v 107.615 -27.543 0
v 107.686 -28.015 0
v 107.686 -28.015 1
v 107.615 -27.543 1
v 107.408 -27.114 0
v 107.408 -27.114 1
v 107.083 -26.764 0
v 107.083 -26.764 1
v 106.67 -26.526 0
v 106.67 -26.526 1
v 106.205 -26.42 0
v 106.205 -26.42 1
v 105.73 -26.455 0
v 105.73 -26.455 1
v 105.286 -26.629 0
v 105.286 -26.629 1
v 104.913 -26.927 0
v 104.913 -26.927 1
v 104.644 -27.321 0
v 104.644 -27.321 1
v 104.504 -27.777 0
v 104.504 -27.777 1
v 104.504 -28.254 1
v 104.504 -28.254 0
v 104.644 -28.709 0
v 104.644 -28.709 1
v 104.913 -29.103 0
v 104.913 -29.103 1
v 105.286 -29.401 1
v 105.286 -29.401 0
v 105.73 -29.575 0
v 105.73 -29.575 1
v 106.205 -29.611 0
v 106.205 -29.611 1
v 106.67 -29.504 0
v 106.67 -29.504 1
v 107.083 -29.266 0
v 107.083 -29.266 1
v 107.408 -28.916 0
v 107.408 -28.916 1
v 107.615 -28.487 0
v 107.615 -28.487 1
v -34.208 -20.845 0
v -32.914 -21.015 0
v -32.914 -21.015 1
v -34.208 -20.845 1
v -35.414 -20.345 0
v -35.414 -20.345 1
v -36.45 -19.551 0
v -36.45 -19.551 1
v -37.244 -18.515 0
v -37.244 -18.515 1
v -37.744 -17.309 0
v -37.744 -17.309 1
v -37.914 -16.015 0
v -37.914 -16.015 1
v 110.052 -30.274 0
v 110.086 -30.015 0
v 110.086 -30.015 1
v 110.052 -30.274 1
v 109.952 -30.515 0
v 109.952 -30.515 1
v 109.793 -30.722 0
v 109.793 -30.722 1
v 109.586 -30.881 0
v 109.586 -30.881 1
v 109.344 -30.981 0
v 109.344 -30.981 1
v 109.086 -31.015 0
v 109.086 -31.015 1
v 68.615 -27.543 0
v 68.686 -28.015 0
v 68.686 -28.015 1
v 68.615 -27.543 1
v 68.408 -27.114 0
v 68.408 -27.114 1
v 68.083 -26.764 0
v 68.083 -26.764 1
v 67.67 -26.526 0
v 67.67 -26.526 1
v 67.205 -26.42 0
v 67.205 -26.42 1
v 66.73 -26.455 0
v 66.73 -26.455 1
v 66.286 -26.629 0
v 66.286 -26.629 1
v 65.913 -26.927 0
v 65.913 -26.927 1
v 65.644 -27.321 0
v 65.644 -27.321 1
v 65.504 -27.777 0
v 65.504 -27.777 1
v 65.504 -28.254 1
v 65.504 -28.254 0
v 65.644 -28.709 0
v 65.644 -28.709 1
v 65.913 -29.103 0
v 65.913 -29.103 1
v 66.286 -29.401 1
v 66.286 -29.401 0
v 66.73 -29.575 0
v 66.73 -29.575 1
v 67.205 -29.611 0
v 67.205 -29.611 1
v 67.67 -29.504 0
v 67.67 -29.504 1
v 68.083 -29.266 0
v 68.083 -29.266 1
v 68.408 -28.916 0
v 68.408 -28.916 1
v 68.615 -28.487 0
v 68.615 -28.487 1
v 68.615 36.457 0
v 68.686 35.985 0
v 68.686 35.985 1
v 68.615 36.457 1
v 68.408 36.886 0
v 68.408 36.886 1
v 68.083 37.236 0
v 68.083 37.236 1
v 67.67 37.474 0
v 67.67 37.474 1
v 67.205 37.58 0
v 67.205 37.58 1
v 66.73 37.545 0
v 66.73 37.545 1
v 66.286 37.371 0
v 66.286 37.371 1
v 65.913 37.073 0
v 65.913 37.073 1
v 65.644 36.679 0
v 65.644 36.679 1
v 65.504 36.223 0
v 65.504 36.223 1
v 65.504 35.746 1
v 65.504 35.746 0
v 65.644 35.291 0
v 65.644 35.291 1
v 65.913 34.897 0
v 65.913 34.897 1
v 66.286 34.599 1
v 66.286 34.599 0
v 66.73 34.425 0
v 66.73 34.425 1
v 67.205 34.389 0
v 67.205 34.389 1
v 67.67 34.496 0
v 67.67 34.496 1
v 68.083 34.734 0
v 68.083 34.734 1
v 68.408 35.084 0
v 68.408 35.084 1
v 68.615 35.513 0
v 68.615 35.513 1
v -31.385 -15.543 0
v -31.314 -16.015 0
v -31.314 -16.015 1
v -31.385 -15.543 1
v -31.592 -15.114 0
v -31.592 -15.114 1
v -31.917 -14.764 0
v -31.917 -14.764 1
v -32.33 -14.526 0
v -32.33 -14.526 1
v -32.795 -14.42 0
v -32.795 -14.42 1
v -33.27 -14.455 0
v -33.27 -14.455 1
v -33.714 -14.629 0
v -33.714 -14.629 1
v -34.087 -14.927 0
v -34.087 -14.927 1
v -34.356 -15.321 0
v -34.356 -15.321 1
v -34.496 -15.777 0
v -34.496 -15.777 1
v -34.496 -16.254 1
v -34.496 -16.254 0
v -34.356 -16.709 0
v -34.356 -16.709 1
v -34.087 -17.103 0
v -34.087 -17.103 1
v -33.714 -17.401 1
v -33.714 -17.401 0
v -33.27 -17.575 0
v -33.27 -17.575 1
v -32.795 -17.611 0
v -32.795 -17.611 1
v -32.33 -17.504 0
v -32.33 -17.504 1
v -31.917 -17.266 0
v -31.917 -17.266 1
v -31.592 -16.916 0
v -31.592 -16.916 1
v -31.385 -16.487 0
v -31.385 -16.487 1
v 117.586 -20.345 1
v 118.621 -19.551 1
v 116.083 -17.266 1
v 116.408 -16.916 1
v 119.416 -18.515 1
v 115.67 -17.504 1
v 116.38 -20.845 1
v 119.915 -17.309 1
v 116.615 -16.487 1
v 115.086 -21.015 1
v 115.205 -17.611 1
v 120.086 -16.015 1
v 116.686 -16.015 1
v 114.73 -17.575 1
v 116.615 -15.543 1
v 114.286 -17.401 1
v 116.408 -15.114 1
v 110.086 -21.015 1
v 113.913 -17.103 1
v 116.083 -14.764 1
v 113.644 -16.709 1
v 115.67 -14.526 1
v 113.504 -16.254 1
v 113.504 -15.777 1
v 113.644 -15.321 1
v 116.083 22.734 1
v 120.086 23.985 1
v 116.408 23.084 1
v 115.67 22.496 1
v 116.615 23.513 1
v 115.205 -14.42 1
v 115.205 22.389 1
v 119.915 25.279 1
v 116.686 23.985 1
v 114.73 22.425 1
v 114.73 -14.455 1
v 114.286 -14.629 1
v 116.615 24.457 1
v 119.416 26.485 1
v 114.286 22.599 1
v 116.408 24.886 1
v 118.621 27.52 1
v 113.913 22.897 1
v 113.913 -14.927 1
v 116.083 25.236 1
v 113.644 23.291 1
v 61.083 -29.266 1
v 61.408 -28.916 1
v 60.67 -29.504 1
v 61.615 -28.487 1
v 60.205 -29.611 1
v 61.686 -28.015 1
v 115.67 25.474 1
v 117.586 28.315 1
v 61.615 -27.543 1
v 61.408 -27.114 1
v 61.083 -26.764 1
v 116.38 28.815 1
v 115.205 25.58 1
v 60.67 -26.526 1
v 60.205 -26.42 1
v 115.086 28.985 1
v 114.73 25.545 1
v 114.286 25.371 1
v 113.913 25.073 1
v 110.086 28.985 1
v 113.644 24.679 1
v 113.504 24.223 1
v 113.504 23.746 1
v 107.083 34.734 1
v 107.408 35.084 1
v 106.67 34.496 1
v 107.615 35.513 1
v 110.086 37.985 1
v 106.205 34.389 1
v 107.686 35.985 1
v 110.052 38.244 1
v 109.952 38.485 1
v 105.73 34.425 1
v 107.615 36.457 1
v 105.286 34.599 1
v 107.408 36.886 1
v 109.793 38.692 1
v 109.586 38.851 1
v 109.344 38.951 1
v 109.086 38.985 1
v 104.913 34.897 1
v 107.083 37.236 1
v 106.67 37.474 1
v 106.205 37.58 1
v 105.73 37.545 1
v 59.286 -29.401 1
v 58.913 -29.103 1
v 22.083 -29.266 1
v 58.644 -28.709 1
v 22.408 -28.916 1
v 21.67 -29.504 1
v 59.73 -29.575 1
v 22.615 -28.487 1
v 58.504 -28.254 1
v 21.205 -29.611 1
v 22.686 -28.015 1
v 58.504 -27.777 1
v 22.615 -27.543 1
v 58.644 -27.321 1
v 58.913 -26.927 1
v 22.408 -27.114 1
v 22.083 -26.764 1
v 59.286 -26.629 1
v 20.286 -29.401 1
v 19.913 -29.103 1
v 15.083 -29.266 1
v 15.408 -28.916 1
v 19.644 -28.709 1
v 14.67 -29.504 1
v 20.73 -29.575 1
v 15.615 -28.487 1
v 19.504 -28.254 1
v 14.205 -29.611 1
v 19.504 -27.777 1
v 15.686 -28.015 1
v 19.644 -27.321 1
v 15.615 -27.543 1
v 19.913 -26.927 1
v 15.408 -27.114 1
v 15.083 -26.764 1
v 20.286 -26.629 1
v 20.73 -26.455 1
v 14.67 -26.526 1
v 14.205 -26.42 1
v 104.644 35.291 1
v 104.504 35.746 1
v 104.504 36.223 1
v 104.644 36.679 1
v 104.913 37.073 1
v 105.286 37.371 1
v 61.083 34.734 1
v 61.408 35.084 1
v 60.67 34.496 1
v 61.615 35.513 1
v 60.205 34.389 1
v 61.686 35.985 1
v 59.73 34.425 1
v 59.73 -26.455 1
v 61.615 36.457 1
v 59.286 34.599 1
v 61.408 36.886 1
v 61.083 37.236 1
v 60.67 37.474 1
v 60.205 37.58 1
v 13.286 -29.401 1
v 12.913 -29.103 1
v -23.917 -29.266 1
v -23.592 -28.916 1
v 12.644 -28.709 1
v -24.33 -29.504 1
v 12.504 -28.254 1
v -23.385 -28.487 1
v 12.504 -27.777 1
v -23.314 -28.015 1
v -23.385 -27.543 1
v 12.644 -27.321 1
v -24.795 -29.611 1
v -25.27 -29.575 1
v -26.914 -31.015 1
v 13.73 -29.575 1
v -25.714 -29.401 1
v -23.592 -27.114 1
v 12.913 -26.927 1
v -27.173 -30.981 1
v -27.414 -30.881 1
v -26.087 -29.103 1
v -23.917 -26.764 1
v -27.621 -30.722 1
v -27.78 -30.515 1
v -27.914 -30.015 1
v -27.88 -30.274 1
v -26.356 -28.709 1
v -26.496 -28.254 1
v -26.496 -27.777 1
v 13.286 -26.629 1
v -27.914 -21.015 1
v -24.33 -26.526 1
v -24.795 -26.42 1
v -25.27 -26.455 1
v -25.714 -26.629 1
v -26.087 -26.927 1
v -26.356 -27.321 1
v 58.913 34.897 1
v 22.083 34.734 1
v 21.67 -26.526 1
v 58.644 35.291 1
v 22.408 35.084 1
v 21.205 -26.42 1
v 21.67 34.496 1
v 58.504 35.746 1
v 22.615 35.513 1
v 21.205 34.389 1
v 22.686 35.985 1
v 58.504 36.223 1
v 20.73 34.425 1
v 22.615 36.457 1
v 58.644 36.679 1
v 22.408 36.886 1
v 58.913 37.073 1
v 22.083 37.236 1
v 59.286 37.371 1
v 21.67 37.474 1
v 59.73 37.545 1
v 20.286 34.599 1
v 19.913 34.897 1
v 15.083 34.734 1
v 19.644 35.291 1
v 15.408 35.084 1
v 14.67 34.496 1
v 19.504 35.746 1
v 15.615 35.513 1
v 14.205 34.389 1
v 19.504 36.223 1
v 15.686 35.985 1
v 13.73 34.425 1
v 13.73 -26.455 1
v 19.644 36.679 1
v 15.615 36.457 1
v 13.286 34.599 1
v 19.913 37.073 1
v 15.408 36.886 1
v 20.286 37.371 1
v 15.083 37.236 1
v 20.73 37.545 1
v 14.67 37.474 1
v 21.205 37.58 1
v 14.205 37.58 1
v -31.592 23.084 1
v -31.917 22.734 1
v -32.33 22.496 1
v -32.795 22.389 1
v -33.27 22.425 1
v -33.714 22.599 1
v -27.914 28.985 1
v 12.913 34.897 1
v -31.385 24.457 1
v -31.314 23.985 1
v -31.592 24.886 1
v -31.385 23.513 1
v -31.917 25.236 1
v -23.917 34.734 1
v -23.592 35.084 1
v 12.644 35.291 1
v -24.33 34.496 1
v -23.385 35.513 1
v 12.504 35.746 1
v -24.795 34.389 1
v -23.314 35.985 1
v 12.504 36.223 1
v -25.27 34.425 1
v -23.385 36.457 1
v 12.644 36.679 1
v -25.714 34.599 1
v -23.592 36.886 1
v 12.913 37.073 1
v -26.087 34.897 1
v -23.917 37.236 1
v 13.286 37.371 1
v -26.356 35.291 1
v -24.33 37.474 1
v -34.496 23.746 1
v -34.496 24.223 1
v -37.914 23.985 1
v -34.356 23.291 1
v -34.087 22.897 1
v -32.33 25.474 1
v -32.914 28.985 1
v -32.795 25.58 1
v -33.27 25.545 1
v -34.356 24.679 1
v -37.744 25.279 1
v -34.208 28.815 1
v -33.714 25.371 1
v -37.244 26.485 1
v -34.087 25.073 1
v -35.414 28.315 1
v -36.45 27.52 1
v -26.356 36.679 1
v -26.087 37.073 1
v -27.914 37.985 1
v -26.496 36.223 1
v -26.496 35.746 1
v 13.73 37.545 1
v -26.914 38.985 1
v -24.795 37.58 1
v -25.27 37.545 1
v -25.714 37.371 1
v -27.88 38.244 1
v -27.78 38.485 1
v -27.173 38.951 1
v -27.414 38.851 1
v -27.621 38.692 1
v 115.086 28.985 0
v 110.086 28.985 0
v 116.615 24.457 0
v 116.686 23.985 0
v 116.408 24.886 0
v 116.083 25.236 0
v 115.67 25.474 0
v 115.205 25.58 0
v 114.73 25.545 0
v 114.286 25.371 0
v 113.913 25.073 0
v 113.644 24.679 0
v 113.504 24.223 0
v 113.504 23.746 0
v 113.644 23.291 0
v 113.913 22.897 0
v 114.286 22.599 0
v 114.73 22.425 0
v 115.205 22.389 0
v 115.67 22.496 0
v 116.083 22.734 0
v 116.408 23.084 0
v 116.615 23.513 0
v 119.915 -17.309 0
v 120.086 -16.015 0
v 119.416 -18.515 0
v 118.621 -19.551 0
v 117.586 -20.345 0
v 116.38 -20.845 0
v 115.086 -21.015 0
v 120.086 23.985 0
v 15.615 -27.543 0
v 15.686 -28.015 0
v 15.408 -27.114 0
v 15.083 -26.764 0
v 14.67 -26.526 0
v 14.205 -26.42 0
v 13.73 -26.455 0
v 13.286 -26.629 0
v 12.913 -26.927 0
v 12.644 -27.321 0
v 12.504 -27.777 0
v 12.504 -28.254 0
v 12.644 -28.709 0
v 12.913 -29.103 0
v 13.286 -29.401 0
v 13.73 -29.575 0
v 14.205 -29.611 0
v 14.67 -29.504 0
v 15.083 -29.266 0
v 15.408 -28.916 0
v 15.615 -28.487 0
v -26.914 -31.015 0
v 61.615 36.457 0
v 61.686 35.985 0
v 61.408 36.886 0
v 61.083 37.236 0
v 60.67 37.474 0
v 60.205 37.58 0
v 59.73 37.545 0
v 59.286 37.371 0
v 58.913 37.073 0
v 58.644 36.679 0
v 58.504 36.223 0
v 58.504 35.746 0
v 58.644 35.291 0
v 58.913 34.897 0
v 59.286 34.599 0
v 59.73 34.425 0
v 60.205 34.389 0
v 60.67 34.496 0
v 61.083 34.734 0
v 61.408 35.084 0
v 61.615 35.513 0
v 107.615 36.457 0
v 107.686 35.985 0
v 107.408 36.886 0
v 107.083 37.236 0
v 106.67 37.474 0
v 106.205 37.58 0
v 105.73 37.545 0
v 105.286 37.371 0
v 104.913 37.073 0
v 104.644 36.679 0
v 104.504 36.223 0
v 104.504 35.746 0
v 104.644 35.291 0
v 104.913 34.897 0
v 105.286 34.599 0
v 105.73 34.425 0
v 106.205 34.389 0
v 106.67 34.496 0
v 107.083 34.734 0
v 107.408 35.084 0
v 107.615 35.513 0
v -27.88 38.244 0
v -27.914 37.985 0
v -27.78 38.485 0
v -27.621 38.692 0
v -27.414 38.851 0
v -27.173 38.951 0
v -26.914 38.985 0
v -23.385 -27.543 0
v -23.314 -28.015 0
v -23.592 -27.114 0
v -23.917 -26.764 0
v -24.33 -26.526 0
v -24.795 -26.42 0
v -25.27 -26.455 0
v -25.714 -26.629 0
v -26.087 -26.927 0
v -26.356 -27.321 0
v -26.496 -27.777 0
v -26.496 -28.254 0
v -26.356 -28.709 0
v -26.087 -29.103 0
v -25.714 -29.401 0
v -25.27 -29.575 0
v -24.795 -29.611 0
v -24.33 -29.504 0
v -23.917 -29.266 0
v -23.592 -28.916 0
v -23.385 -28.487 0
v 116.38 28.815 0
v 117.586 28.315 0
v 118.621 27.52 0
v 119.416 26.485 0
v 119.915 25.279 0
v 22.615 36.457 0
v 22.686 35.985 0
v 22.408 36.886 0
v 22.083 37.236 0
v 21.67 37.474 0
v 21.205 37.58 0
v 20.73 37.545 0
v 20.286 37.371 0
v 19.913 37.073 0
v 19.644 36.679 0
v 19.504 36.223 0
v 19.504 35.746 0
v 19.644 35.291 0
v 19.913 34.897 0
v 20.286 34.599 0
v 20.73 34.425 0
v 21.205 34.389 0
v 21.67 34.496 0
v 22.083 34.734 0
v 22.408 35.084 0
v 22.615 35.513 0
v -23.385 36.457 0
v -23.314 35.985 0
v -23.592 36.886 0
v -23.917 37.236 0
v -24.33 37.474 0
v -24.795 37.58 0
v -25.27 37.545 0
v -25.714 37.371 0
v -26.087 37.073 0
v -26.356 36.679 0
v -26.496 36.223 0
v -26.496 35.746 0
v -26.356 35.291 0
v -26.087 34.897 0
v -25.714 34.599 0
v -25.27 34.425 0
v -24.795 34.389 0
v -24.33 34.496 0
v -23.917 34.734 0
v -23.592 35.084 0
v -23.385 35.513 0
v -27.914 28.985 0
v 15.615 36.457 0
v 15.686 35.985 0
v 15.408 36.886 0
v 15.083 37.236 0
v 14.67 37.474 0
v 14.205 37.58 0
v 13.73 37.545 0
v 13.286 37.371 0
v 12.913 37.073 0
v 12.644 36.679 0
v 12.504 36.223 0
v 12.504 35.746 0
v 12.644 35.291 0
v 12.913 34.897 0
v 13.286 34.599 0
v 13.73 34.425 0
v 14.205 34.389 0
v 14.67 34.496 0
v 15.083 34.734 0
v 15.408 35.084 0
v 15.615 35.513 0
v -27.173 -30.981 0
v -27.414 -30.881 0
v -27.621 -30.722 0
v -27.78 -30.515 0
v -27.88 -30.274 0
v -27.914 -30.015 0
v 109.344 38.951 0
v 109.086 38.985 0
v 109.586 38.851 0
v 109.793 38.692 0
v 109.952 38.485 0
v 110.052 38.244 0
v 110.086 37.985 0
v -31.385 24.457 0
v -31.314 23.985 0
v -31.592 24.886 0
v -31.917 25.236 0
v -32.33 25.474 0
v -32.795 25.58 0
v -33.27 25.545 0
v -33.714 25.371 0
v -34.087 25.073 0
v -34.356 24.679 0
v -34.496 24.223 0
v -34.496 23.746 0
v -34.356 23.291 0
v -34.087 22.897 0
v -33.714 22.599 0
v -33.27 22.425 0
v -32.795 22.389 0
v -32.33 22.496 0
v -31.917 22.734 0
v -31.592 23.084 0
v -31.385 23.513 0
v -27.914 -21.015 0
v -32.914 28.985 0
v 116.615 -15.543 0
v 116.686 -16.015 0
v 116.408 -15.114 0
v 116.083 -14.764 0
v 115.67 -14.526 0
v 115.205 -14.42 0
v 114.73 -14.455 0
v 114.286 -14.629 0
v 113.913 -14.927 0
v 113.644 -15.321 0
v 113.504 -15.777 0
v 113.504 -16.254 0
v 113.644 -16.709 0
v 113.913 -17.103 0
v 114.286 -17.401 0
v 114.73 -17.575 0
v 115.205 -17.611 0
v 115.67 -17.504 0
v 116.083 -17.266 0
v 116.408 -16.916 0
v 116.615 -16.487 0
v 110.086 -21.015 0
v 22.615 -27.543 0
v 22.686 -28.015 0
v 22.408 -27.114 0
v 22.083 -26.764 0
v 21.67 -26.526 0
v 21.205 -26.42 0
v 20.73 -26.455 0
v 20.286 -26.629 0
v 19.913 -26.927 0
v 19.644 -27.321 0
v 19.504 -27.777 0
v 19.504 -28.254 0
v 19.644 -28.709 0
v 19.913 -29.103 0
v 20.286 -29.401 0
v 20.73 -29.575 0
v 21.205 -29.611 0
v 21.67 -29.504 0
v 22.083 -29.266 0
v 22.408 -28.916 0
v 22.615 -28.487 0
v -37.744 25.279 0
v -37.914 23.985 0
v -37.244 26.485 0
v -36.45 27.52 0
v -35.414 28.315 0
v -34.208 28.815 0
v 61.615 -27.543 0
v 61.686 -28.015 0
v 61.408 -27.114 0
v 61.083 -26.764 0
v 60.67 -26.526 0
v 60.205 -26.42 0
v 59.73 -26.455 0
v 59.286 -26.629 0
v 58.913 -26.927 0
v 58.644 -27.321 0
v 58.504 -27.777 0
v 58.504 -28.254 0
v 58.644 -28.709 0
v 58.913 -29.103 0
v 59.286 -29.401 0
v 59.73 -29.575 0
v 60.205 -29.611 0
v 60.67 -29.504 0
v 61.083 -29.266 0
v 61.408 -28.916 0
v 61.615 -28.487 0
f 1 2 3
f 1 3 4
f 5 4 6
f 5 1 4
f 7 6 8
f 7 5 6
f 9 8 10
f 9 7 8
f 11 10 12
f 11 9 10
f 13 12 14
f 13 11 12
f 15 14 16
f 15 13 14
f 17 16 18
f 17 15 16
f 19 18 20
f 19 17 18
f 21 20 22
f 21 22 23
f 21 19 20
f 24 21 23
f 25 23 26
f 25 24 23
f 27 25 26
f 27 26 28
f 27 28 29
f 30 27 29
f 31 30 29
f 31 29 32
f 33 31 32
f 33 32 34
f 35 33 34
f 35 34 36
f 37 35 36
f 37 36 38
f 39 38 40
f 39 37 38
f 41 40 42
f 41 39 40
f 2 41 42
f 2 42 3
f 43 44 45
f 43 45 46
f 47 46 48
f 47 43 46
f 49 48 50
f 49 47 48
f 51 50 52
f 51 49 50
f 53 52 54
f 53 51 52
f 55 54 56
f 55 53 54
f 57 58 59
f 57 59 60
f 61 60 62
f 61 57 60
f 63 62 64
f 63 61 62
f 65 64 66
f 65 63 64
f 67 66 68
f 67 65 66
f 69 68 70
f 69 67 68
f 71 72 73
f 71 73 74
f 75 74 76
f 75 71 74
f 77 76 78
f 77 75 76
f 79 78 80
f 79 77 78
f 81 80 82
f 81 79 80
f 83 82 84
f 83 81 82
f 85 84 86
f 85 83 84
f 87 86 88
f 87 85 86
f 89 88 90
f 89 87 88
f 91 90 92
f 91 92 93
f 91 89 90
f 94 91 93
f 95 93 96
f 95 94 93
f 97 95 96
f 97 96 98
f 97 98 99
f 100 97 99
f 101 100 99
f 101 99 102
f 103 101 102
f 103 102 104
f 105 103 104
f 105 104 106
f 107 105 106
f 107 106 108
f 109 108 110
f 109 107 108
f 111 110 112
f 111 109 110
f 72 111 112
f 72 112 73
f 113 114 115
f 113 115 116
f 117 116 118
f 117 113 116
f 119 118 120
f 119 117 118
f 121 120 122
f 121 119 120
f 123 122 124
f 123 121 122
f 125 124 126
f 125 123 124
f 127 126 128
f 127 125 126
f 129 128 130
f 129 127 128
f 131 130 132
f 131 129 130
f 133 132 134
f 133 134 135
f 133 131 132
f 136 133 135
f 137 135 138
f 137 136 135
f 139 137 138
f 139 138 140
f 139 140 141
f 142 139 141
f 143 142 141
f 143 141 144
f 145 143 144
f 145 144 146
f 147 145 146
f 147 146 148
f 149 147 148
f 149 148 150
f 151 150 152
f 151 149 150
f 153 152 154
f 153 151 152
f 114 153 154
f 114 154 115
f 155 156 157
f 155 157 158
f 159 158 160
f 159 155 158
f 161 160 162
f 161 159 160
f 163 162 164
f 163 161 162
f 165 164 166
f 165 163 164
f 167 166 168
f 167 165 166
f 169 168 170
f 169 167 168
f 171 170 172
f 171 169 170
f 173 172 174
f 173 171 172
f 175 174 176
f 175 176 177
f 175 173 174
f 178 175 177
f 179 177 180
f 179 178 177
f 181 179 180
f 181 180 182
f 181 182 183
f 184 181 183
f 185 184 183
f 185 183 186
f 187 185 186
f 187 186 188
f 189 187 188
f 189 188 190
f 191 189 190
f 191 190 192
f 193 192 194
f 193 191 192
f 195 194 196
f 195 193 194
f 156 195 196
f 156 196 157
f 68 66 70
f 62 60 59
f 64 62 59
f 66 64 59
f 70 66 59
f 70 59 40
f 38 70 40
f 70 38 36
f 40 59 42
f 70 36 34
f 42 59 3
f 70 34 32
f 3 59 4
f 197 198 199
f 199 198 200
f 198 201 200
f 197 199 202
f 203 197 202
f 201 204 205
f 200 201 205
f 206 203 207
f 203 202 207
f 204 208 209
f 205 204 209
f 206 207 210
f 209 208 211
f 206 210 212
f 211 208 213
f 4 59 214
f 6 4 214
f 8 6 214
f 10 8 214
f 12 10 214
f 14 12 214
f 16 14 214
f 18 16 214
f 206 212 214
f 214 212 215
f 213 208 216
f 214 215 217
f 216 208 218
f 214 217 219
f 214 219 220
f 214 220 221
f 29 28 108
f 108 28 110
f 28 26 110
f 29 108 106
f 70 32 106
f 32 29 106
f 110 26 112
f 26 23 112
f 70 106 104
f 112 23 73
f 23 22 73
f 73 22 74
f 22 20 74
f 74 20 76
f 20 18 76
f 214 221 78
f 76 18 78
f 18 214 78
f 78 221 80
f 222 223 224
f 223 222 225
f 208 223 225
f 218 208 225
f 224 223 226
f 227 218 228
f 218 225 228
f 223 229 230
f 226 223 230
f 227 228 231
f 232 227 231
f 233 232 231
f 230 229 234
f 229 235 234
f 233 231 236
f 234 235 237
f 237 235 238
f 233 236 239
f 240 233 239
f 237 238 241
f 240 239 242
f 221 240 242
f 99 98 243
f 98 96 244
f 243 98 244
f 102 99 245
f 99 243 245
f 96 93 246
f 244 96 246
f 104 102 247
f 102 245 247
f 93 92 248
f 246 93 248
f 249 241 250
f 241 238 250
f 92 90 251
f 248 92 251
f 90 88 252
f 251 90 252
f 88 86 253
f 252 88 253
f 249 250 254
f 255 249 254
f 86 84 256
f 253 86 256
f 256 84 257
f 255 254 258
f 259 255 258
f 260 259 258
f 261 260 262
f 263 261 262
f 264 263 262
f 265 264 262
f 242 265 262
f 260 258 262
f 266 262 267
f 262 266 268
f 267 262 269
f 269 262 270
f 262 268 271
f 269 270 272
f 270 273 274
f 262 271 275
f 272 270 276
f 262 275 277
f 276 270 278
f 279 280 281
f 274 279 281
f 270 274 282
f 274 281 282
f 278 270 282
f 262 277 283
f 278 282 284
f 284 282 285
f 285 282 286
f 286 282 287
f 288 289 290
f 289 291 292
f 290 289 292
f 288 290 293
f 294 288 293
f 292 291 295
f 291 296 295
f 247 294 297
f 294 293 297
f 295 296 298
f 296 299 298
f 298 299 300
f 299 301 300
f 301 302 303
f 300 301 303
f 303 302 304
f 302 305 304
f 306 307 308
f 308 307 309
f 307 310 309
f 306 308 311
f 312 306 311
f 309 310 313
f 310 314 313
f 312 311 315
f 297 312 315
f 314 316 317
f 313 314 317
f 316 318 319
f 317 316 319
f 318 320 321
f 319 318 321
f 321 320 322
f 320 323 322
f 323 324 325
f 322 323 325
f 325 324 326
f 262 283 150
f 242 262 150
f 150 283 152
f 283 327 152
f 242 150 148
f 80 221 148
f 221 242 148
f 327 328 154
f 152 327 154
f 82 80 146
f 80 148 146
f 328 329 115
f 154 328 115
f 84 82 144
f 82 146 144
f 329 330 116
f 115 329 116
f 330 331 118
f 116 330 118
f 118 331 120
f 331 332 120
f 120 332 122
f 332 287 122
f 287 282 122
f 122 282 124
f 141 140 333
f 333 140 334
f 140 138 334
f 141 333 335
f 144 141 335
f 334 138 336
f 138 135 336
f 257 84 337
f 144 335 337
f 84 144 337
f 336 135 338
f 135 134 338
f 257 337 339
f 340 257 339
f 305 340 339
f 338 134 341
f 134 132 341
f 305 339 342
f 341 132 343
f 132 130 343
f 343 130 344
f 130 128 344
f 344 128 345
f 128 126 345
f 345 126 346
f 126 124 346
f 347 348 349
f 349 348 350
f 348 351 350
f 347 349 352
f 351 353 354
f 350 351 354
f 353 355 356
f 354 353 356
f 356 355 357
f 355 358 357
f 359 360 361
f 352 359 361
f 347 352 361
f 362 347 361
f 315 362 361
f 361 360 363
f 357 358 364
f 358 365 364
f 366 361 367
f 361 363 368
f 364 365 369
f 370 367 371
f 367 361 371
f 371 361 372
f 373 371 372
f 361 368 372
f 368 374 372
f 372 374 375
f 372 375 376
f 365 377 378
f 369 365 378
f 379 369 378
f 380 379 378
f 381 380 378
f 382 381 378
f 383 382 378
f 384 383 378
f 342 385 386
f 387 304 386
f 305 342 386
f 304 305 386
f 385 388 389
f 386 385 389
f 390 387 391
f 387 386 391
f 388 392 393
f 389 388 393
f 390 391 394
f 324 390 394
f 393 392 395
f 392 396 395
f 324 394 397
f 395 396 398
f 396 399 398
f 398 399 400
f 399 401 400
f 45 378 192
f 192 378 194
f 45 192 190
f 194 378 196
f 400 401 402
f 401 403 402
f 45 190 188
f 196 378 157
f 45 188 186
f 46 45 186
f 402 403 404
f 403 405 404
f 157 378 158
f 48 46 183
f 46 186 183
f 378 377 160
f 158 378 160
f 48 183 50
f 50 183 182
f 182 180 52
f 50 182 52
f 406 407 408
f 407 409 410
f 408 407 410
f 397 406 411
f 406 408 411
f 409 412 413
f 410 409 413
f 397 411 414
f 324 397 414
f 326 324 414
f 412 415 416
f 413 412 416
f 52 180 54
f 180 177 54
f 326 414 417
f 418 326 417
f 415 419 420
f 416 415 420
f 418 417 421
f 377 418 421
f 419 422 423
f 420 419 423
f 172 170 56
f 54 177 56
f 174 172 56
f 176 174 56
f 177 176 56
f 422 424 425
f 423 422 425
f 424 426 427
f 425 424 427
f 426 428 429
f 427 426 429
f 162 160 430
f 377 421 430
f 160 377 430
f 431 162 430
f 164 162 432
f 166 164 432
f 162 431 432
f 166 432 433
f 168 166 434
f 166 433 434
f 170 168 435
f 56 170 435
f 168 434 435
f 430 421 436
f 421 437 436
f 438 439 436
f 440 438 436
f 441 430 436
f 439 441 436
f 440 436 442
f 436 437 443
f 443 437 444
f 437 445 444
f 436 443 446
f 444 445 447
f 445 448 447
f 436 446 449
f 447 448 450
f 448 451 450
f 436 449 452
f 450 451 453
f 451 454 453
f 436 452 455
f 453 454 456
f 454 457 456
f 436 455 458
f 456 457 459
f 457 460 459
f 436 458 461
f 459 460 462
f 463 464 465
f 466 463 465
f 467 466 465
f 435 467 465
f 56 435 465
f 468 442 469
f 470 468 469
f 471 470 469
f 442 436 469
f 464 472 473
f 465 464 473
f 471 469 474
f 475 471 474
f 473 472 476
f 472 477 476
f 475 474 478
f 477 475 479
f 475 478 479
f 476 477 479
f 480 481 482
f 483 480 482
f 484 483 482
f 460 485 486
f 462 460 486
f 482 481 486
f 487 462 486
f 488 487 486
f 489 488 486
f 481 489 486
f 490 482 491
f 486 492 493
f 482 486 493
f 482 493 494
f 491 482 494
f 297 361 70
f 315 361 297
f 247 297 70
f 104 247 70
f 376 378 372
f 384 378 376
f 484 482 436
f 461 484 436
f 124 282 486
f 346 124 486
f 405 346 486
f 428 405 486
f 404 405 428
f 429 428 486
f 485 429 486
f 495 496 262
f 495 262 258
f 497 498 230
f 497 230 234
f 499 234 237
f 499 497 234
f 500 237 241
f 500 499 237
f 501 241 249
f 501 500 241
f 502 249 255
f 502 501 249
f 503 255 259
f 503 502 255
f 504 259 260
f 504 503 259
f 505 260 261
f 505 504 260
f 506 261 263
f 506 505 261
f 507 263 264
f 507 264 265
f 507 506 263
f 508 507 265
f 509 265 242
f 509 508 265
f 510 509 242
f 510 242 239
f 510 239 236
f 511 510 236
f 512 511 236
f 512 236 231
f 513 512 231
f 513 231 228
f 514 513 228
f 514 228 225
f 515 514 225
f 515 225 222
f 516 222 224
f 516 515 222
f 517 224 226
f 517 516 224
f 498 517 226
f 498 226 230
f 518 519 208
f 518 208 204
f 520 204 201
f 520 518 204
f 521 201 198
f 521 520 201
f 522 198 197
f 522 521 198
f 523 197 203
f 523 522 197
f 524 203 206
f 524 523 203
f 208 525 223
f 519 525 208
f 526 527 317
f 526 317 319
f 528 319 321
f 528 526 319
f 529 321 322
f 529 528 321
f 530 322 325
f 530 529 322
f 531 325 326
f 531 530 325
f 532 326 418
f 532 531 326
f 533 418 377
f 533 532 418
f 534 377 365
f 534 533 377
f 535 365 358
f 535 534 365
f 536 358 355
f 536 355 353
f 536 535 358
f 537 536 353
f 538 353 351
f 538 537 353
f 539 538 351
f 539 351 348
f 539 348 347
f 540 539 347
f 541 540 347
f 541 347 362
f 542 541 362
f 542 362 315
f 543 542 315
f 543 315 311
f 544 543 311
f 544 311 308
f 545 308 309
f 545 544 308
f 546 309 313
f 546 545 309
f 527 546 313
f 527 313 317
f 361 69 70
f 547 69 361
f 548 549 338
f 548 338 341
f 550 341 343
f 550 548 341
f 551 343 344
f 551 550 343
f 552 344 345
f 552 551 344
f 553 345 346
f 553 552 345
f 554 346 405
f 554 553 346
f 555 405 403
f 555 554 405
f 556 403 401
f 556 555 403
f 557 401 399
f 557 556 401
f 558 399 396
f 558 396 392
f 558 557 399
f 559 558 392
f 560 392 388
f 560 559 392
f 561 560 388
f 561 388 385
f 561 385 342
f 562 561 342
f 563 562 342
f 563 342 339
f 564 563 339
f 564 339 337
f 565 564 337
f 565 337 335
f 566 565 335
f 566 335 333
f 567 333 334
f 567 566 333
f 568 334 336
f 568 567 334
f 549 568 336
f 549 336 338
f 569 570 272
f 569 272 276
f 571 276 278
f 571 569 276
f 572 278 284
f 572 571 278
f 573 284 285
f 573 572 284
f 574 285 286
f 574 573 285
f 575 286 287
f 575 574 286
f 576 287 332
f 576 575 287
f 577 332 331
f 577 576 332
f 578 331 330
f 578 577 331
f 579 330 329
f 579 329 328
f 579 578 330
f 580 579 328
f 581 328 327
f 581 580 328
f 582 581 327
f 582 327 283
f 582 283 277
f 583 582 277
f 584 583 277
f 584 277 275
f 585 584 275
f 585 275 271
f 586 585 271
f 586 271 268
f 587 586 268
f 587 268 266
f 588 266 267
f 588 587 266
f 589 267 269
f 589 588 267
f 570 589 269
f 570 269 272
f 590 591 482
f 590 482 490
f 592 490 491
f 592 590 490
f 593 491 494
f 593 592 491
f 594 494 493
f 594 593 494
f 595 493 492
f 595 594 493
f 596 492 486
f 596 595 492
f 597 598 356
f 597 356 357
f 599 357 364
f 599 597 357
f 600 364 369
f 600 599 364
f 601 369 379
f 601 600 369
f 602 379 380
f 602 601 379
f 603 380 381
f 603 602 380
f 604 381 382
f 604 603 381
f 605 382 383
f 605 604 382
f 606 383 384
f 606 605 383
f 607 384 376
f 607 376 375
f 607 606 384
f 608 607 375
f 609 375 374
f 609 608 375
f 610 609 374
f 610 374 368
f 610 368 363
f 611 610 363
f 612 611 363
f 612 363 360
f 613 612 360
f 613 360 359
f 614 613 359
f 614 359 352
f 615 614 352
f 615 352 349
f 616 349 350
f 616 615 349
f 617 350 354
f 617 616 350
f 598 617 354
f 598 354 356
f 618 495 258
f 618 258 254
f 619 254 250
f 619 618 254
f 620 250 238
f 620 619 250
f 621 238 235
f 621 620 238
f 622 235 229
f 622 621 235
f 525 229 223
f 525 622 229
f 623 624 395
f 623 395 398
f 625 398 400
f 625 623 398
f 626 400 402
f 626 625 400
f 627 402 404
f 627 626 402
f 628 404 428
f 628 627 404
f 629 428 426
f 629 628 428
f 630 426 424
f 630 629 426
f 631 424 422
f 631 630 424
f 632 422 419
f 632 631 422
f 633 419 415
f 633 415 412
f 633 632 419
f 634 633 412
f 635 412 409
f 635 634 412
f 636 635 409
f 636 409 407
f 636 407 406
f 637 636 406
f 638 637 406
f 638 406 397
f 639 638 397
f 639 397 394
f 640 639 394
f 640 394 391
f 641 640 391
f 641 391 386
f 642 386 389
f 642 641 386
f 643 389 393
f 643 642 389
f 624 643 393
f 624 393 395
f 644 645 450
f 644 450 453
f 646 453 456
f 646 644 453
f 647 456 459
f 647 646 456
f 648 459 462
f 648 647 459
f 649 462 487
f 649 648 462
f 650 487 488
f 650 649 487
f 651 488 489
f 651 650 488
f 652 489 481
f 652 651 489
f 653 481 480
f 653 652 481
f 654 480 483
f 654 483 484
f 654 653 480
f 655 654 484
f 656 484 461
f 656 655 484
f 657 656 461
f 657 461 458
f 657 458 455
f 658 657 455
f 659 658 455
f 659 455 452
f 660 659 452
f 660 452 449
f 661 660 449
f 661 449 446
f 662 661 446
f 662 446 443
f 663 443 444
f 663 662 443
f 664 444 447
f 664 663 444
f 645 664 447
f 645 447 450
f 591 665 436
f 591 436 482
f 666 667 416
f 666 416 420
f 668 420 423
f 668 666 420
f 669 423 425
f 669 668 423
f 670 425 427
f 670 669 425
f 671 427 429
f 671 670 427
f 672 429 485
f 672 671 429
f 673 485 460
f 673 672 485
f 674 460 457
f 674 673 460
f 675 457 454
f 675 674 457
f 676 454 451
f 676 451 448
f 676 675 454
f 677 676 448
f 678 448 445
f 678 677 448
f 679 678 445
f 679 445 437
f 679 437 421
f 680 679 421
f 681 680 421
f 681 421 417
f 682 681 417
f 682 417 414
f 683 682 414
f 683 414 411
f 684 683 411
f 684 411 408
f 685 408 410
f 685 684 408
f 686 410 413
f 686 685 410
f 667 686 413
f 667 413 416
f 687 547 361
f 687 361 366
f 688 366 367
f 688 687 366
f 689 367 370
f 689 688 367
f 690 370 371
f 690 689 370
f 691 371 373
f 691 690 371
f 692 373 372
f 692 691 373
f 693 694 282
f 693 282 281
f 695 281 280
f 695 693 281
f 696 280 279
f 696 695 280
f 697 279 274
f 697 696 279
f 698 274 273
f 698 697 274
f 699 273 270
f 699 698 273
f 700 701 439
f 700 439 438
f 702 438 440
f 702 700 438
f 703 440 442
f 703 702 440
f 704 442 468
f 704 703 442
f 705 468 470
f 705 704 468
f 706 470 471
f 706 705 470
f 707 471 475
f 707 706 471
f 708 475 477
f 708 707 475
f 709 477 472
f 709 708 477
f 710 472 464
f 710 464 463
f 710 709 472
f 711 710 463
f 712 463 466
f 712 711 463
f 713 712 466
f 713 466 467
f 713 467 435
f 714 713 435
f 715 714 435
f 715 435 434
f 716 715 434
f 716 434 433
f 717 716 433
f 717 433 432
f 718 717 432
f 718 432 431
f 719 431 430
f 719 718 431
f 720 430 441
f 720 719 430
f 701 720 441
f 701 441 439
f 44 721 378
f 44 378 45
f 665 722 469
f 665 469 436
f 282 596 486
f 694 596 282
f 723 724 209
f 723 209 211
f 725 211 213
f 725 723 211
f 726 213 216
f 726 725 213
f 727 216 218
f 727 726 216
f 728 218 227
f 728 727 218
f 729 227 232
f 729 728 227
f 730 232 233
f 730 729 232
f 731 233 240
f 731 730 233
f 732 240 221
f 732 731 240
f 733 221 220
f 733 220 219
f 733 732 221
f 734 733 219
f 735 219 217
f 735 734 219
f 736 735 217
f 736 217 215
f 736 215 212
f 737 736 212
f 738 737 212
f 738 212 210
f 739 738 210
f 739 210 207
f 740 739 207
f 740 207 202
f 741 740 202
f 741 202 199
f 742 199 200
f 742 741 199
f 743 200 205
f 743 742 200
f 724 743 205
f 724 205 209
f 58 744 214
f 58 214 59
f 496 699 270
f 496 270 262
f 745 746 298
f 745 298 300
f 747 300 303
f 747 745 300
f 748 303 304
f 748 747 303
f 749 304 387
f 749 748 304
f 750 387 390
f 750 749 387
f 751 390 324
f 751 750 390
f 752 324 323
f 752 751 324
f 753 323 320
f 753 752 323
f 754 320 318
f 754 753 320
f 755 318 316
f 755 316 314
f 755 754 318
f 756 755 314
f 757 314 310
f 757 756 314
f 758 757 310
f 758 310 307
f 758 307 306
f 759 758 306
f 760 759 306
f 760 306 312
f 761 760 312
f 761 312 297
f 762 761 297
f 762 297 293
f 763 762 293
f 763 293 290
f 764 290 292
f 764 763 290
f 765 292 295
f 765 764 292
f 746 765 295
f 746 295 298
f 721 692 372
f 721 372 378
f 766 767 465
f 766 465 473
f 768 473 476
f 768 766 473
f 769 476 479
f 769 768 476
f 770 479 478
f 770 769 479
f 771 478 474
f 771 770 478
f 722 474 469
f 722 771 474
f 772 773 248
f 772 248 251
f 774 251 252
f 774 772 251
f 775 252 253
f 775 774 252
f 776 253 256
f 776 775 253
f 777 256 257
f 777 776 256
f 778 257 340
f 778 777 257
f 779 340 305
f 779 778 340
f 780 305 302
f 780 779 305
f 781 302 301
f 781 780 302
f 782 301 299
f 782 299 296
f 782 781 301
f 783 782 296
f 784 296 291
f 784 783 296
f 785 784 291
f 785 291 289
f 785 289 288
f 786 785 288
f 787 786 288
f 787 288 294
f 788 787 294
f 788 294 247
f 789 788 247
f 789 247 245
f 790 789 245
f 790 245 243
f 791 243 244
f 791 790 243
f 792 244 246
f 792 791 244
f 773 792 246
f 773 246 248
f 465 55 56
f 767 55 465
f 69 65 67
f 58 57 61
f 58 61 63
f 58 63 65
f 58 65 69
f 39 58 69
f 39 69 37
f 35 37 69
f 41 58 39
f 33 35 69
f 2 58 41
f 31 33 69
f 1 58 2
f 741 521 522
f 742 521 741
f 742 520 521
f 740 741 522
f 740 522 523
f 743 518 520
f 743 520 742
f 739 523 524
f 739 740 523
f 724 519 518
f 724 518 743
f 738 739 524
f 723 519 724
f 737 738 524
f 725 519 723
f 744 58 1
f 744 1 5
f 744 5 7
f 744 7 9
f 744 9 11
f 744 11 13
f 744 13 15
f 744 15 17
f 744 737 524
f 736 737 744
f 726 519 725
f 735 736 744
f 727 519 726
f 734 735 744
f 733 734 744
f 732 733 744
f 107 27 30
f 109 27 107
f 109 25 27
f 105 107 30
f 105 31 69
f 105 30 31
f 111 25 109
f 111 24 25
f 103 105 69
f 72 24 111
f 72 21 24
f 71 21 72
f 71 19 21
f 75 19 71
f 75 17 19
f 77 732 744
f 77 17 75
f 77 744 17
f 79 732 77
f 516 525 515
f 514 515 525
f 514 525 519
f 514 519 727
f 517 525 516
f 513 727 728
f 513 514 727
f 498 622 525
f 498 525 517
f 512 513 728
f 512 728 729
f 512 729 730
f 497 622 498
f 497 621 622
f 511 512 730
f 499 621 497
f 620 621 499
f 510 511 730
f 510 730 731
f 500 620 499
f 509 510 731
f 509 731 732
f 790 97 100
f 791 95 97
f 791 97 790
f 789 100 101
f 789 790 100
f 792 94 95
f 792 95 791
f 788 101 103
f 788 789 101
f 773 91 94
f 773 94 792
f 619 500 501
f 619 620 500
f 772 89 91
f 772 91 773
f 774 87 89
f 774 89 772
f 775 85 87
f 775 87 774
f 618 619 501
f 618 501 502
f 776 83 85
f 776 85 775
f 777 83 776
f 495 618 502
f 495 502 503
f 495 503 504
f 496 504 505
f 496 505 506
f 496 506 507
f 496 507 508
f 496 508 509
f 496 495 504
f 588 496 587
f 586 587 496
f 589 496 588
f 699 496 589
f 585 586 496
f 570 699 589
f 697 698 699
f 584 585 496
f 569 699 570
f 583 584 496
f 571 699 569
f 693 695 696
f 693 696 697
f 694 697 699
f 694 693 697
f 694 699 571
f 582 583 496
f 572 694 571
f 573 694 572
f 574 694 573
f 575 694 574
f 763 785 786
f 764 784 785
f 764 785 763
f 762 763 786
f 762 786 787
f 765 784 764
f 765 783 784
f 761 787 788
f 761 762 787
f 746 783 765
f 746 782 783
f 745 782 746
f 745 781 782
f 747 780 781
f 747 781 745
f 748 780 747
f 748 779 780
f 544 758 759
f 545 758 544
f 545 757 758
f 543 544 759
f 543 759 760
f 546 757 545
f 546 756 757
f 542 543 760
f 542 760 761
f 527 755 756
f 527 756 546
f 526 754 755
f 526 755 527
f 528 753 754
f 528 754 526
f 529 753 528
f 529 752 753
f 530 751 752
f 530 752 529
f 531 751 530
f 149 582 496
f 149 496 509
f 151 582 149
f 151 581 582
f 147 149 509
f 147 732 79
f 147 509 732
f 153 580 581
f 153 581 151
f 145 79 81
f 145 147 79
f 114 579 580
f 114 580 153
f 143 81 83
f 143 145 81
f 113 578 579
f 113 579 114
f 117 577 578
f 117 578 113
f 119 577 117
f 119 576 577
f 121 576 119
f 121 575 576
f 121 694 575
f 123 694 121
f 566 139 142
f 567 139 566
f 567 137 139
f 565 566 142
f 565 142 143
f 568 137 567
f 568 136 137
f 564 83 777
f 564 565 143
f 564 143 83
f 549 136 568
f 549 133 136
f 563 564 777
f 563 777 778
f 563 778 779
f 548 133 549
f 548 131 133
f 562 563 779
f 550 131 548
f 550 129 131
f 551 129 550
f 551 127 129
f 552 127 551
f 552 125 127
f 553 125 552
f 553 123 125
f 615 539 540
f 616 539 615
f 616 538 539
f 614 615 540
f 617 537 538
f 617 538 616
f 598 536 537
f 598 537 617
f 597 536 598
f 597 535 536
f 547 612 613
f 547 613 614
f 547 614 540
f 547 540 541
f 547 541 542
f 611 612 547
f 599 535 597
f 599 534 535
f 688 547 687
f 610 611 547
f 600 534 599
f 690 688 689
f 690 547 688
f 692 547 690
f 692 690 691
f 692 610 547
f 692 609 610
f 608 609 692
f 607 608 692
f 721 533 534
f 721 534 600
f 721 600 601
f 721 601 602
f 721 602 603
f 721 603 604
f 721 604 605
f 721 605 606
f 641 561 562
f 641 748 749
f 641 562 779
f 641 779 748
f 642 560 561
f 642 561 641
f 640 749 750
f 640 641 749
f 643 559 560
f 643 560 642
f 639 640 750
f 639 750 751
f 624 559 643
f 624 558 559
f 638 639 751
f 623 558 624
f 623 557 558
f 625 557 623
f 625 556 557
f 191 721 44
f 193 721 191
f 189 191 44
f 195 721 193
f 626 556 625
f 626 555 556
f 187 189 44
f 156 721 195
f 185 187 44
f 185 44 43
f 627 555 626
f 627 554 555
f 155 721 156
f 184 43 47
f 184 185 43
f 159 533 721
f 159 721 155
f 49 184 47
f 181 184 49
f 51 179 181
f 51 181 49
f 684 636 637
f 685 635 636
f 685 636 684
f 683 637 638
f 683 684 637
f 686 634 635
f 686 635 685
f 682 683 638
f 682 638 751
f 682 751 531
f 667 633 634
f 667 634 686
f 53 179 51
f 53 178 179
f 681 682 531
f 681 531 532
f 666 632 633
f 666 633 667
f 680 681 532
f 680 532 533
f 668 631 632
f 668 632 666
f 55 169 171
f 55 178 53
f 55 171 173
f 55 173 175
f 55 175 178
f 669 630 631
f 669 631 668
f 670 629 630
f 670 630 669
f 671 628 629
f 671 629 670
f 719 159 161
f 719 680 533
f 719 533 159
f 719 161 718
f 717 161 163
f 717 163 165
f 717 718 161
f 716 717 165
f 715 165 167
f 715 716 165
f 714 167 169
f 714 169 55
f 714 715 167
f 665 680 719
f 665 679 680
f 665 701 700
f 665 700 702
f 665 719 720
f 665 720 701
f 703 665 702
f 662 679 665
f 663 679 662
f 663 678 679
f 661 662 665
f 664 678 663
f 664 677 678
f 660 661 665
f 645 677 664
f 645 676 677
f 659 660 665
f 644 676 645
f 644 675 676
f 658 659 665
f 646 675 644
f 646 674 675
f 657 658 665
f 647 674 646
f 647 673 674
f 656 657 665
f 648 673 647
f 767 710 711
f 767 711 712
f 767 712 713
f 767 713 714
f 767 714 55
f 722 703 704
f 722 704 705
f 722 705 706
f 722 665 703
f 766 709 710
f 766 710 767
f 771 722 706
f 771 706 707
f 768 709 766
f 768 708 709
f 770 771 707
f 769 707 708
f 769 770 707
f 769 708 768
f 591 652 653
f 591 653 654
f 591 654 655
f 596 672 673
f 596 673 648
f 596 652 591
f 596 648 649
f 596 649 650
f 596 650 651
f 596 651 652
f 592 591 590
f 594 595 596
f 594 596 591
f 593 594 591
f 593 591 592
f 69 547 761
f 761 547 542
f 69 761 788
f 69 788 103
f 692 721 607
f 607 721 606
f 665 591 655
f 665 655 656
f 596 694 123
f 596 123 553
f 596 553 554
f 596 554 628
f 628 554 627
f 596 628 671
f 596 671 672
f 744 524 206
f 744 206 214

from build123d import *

# Parameters (mm, degrees)
SKETCH1_R           = 1.6
BOSS_EXTRUDE1_DEPTH = 1


with BuildPart() as part:
    # Sketch1 → Boss-Extrude1 (new body)
    with BuildSketch(Plane.XY):
        with BuildLine():
            Line((110.085666764, -21.015048426), (110.085666764, -30.015048426))
            ThreePointArc((110.085666764, -30.015048426), (109.792773545, -30.722155207), (109.085666764, -31.015048426))
            Line((109.085666764, -31.015048426), (-26.914333236, -31.015048426))
            ThreePointArc((-26.914333236, -31.015048426), (-27.621440018, -30.722155207), (-27.914333236, -30.015048426))
            Line((-27.914333236, -30.015048426), (-27.914333236, -21.015048426))
            Line((-27.914333236, -21.015048426), (-32.914333236, -21.015048426))
            ThreePointArc((-32.914333236, -21.015048426), (-36.449867142, -19.550582332), (-37.914333236, -16.015048426))
            Line((-37.914333236, -16.015048426), (-37.914333236, 23.984951574))
            ThreePointArc((-37.914333236, 23.984951574), (-36.449867142, 27.52048548), (-32.914333236, 28.984951574))
            Line((-32.914333236, 28.984951574), (-27.914333236, 28.984951574))
            Line((-27.914333236, 28.984951574), (-27.914333236, 37.984951574))
            ThreePointArc((-27.914333236, 37.984951574), (-27.621440018, 38.692058356), (-26.914333236, 38.984951574))
            Line((-26.914333236, 38.984951574), (109.085666764, 38.984951574))
            ThreePointArc((109.085666764, 38.984951574), (109.792773545, 38.692058356), (110.085666764, 37.984951574))
            Line((110.085666764, 37.984951574), (110.085666764, 28.984951574))
            Line((110.085666764, 28.984951574), (115.085666764, 28.984951574))
            ThreePointArc((115.085666764, 28.984951574), (118.62120067, 27.52048548), (120.085666764, 23.984951574))
            Line((120.085666764, 23.984951574), (120.085666764, -16.015048426))
            ThreePointArc((120.085666764, -16.015048426), (118.62120067, -19.550582332), (115.085666764, -21.015048426))
            Line((115.085666764, -21.015048426), (110.085666764, -21.015048426))
        make_face()
        with Locations((-24.914333236, 35.984951574)):
            Circle(SKETCH1_R, mode=Mode.SUBTRACT)
        with Locations((14.085666764, 35.984951574)):
            Circle(SKETCH1_R, mode=Mode.SUBTRACT)
        with Locations((-24.914333236, -28.015048426)):
            Circle(SKETCH1_R, mode=Mode.SUBTRACT)
        with Locations((14.085666764, -28.015048426)):
            Circle(SKETCH1_R, mode=Mode.SUBTRACT)
        with Locations((21.085666764, 35.984951574)):
            Circle(SKETCH1_R, mode=Mode.SUBTRACT)
        with Locations((60.085666764, 35.984951574)):
            Circle(SKETCH1_R, mode=Mode.SUBTRACT)
        with Locations((60.085666764, -28.015048426)):
            Circle(SKETCH1_R, mode=Mode.SUBTRACT)
        with Locations((21.085666764, -28.015048426)):
            Circle(SKETCH1_R, mode=Mode.SUBTRACT)
        with Locations((67.085666764, 35.984951574)):
            Circle(SKETCH1_R, mode=Mode.SUBTRACT)
        with Locations((106.085666764, 35.984951574)):
            Circle(SKETCH1_R, mode=Mode.SUBTRACT)
        with Locations((106.085666764, -28.015048426)):
            Circle(SKETCH1_R, mode=Mode.SUBTRACT)
        with Locations((67.085666764, -28.015048426)):
            Circle(SKETCH1_R, mode=Mode.SUBTRACT)
        with Locations((-32.914333236, -16.015048426)):
            Circle(SKETCH1_R, mode=Mode.SUBTRACT)
        with Locations((-32.914333236, 23.984951574)):
            Circle(SKETCH1_R, mode=Mode.SUBTRACT)
        with Locations((115.085666764, 23.984951574)):
            Circle(SKETCH1_R, mode=Mode.SUBTRACT)
        with Locations((115.085666764, -16.015048426)):
            Circle(SKETCH1_R, mode=Mode.SUBTRACT)
    extrude(amount=BOSS_EXTRUDE1_DEPTH)


solid = part.part
